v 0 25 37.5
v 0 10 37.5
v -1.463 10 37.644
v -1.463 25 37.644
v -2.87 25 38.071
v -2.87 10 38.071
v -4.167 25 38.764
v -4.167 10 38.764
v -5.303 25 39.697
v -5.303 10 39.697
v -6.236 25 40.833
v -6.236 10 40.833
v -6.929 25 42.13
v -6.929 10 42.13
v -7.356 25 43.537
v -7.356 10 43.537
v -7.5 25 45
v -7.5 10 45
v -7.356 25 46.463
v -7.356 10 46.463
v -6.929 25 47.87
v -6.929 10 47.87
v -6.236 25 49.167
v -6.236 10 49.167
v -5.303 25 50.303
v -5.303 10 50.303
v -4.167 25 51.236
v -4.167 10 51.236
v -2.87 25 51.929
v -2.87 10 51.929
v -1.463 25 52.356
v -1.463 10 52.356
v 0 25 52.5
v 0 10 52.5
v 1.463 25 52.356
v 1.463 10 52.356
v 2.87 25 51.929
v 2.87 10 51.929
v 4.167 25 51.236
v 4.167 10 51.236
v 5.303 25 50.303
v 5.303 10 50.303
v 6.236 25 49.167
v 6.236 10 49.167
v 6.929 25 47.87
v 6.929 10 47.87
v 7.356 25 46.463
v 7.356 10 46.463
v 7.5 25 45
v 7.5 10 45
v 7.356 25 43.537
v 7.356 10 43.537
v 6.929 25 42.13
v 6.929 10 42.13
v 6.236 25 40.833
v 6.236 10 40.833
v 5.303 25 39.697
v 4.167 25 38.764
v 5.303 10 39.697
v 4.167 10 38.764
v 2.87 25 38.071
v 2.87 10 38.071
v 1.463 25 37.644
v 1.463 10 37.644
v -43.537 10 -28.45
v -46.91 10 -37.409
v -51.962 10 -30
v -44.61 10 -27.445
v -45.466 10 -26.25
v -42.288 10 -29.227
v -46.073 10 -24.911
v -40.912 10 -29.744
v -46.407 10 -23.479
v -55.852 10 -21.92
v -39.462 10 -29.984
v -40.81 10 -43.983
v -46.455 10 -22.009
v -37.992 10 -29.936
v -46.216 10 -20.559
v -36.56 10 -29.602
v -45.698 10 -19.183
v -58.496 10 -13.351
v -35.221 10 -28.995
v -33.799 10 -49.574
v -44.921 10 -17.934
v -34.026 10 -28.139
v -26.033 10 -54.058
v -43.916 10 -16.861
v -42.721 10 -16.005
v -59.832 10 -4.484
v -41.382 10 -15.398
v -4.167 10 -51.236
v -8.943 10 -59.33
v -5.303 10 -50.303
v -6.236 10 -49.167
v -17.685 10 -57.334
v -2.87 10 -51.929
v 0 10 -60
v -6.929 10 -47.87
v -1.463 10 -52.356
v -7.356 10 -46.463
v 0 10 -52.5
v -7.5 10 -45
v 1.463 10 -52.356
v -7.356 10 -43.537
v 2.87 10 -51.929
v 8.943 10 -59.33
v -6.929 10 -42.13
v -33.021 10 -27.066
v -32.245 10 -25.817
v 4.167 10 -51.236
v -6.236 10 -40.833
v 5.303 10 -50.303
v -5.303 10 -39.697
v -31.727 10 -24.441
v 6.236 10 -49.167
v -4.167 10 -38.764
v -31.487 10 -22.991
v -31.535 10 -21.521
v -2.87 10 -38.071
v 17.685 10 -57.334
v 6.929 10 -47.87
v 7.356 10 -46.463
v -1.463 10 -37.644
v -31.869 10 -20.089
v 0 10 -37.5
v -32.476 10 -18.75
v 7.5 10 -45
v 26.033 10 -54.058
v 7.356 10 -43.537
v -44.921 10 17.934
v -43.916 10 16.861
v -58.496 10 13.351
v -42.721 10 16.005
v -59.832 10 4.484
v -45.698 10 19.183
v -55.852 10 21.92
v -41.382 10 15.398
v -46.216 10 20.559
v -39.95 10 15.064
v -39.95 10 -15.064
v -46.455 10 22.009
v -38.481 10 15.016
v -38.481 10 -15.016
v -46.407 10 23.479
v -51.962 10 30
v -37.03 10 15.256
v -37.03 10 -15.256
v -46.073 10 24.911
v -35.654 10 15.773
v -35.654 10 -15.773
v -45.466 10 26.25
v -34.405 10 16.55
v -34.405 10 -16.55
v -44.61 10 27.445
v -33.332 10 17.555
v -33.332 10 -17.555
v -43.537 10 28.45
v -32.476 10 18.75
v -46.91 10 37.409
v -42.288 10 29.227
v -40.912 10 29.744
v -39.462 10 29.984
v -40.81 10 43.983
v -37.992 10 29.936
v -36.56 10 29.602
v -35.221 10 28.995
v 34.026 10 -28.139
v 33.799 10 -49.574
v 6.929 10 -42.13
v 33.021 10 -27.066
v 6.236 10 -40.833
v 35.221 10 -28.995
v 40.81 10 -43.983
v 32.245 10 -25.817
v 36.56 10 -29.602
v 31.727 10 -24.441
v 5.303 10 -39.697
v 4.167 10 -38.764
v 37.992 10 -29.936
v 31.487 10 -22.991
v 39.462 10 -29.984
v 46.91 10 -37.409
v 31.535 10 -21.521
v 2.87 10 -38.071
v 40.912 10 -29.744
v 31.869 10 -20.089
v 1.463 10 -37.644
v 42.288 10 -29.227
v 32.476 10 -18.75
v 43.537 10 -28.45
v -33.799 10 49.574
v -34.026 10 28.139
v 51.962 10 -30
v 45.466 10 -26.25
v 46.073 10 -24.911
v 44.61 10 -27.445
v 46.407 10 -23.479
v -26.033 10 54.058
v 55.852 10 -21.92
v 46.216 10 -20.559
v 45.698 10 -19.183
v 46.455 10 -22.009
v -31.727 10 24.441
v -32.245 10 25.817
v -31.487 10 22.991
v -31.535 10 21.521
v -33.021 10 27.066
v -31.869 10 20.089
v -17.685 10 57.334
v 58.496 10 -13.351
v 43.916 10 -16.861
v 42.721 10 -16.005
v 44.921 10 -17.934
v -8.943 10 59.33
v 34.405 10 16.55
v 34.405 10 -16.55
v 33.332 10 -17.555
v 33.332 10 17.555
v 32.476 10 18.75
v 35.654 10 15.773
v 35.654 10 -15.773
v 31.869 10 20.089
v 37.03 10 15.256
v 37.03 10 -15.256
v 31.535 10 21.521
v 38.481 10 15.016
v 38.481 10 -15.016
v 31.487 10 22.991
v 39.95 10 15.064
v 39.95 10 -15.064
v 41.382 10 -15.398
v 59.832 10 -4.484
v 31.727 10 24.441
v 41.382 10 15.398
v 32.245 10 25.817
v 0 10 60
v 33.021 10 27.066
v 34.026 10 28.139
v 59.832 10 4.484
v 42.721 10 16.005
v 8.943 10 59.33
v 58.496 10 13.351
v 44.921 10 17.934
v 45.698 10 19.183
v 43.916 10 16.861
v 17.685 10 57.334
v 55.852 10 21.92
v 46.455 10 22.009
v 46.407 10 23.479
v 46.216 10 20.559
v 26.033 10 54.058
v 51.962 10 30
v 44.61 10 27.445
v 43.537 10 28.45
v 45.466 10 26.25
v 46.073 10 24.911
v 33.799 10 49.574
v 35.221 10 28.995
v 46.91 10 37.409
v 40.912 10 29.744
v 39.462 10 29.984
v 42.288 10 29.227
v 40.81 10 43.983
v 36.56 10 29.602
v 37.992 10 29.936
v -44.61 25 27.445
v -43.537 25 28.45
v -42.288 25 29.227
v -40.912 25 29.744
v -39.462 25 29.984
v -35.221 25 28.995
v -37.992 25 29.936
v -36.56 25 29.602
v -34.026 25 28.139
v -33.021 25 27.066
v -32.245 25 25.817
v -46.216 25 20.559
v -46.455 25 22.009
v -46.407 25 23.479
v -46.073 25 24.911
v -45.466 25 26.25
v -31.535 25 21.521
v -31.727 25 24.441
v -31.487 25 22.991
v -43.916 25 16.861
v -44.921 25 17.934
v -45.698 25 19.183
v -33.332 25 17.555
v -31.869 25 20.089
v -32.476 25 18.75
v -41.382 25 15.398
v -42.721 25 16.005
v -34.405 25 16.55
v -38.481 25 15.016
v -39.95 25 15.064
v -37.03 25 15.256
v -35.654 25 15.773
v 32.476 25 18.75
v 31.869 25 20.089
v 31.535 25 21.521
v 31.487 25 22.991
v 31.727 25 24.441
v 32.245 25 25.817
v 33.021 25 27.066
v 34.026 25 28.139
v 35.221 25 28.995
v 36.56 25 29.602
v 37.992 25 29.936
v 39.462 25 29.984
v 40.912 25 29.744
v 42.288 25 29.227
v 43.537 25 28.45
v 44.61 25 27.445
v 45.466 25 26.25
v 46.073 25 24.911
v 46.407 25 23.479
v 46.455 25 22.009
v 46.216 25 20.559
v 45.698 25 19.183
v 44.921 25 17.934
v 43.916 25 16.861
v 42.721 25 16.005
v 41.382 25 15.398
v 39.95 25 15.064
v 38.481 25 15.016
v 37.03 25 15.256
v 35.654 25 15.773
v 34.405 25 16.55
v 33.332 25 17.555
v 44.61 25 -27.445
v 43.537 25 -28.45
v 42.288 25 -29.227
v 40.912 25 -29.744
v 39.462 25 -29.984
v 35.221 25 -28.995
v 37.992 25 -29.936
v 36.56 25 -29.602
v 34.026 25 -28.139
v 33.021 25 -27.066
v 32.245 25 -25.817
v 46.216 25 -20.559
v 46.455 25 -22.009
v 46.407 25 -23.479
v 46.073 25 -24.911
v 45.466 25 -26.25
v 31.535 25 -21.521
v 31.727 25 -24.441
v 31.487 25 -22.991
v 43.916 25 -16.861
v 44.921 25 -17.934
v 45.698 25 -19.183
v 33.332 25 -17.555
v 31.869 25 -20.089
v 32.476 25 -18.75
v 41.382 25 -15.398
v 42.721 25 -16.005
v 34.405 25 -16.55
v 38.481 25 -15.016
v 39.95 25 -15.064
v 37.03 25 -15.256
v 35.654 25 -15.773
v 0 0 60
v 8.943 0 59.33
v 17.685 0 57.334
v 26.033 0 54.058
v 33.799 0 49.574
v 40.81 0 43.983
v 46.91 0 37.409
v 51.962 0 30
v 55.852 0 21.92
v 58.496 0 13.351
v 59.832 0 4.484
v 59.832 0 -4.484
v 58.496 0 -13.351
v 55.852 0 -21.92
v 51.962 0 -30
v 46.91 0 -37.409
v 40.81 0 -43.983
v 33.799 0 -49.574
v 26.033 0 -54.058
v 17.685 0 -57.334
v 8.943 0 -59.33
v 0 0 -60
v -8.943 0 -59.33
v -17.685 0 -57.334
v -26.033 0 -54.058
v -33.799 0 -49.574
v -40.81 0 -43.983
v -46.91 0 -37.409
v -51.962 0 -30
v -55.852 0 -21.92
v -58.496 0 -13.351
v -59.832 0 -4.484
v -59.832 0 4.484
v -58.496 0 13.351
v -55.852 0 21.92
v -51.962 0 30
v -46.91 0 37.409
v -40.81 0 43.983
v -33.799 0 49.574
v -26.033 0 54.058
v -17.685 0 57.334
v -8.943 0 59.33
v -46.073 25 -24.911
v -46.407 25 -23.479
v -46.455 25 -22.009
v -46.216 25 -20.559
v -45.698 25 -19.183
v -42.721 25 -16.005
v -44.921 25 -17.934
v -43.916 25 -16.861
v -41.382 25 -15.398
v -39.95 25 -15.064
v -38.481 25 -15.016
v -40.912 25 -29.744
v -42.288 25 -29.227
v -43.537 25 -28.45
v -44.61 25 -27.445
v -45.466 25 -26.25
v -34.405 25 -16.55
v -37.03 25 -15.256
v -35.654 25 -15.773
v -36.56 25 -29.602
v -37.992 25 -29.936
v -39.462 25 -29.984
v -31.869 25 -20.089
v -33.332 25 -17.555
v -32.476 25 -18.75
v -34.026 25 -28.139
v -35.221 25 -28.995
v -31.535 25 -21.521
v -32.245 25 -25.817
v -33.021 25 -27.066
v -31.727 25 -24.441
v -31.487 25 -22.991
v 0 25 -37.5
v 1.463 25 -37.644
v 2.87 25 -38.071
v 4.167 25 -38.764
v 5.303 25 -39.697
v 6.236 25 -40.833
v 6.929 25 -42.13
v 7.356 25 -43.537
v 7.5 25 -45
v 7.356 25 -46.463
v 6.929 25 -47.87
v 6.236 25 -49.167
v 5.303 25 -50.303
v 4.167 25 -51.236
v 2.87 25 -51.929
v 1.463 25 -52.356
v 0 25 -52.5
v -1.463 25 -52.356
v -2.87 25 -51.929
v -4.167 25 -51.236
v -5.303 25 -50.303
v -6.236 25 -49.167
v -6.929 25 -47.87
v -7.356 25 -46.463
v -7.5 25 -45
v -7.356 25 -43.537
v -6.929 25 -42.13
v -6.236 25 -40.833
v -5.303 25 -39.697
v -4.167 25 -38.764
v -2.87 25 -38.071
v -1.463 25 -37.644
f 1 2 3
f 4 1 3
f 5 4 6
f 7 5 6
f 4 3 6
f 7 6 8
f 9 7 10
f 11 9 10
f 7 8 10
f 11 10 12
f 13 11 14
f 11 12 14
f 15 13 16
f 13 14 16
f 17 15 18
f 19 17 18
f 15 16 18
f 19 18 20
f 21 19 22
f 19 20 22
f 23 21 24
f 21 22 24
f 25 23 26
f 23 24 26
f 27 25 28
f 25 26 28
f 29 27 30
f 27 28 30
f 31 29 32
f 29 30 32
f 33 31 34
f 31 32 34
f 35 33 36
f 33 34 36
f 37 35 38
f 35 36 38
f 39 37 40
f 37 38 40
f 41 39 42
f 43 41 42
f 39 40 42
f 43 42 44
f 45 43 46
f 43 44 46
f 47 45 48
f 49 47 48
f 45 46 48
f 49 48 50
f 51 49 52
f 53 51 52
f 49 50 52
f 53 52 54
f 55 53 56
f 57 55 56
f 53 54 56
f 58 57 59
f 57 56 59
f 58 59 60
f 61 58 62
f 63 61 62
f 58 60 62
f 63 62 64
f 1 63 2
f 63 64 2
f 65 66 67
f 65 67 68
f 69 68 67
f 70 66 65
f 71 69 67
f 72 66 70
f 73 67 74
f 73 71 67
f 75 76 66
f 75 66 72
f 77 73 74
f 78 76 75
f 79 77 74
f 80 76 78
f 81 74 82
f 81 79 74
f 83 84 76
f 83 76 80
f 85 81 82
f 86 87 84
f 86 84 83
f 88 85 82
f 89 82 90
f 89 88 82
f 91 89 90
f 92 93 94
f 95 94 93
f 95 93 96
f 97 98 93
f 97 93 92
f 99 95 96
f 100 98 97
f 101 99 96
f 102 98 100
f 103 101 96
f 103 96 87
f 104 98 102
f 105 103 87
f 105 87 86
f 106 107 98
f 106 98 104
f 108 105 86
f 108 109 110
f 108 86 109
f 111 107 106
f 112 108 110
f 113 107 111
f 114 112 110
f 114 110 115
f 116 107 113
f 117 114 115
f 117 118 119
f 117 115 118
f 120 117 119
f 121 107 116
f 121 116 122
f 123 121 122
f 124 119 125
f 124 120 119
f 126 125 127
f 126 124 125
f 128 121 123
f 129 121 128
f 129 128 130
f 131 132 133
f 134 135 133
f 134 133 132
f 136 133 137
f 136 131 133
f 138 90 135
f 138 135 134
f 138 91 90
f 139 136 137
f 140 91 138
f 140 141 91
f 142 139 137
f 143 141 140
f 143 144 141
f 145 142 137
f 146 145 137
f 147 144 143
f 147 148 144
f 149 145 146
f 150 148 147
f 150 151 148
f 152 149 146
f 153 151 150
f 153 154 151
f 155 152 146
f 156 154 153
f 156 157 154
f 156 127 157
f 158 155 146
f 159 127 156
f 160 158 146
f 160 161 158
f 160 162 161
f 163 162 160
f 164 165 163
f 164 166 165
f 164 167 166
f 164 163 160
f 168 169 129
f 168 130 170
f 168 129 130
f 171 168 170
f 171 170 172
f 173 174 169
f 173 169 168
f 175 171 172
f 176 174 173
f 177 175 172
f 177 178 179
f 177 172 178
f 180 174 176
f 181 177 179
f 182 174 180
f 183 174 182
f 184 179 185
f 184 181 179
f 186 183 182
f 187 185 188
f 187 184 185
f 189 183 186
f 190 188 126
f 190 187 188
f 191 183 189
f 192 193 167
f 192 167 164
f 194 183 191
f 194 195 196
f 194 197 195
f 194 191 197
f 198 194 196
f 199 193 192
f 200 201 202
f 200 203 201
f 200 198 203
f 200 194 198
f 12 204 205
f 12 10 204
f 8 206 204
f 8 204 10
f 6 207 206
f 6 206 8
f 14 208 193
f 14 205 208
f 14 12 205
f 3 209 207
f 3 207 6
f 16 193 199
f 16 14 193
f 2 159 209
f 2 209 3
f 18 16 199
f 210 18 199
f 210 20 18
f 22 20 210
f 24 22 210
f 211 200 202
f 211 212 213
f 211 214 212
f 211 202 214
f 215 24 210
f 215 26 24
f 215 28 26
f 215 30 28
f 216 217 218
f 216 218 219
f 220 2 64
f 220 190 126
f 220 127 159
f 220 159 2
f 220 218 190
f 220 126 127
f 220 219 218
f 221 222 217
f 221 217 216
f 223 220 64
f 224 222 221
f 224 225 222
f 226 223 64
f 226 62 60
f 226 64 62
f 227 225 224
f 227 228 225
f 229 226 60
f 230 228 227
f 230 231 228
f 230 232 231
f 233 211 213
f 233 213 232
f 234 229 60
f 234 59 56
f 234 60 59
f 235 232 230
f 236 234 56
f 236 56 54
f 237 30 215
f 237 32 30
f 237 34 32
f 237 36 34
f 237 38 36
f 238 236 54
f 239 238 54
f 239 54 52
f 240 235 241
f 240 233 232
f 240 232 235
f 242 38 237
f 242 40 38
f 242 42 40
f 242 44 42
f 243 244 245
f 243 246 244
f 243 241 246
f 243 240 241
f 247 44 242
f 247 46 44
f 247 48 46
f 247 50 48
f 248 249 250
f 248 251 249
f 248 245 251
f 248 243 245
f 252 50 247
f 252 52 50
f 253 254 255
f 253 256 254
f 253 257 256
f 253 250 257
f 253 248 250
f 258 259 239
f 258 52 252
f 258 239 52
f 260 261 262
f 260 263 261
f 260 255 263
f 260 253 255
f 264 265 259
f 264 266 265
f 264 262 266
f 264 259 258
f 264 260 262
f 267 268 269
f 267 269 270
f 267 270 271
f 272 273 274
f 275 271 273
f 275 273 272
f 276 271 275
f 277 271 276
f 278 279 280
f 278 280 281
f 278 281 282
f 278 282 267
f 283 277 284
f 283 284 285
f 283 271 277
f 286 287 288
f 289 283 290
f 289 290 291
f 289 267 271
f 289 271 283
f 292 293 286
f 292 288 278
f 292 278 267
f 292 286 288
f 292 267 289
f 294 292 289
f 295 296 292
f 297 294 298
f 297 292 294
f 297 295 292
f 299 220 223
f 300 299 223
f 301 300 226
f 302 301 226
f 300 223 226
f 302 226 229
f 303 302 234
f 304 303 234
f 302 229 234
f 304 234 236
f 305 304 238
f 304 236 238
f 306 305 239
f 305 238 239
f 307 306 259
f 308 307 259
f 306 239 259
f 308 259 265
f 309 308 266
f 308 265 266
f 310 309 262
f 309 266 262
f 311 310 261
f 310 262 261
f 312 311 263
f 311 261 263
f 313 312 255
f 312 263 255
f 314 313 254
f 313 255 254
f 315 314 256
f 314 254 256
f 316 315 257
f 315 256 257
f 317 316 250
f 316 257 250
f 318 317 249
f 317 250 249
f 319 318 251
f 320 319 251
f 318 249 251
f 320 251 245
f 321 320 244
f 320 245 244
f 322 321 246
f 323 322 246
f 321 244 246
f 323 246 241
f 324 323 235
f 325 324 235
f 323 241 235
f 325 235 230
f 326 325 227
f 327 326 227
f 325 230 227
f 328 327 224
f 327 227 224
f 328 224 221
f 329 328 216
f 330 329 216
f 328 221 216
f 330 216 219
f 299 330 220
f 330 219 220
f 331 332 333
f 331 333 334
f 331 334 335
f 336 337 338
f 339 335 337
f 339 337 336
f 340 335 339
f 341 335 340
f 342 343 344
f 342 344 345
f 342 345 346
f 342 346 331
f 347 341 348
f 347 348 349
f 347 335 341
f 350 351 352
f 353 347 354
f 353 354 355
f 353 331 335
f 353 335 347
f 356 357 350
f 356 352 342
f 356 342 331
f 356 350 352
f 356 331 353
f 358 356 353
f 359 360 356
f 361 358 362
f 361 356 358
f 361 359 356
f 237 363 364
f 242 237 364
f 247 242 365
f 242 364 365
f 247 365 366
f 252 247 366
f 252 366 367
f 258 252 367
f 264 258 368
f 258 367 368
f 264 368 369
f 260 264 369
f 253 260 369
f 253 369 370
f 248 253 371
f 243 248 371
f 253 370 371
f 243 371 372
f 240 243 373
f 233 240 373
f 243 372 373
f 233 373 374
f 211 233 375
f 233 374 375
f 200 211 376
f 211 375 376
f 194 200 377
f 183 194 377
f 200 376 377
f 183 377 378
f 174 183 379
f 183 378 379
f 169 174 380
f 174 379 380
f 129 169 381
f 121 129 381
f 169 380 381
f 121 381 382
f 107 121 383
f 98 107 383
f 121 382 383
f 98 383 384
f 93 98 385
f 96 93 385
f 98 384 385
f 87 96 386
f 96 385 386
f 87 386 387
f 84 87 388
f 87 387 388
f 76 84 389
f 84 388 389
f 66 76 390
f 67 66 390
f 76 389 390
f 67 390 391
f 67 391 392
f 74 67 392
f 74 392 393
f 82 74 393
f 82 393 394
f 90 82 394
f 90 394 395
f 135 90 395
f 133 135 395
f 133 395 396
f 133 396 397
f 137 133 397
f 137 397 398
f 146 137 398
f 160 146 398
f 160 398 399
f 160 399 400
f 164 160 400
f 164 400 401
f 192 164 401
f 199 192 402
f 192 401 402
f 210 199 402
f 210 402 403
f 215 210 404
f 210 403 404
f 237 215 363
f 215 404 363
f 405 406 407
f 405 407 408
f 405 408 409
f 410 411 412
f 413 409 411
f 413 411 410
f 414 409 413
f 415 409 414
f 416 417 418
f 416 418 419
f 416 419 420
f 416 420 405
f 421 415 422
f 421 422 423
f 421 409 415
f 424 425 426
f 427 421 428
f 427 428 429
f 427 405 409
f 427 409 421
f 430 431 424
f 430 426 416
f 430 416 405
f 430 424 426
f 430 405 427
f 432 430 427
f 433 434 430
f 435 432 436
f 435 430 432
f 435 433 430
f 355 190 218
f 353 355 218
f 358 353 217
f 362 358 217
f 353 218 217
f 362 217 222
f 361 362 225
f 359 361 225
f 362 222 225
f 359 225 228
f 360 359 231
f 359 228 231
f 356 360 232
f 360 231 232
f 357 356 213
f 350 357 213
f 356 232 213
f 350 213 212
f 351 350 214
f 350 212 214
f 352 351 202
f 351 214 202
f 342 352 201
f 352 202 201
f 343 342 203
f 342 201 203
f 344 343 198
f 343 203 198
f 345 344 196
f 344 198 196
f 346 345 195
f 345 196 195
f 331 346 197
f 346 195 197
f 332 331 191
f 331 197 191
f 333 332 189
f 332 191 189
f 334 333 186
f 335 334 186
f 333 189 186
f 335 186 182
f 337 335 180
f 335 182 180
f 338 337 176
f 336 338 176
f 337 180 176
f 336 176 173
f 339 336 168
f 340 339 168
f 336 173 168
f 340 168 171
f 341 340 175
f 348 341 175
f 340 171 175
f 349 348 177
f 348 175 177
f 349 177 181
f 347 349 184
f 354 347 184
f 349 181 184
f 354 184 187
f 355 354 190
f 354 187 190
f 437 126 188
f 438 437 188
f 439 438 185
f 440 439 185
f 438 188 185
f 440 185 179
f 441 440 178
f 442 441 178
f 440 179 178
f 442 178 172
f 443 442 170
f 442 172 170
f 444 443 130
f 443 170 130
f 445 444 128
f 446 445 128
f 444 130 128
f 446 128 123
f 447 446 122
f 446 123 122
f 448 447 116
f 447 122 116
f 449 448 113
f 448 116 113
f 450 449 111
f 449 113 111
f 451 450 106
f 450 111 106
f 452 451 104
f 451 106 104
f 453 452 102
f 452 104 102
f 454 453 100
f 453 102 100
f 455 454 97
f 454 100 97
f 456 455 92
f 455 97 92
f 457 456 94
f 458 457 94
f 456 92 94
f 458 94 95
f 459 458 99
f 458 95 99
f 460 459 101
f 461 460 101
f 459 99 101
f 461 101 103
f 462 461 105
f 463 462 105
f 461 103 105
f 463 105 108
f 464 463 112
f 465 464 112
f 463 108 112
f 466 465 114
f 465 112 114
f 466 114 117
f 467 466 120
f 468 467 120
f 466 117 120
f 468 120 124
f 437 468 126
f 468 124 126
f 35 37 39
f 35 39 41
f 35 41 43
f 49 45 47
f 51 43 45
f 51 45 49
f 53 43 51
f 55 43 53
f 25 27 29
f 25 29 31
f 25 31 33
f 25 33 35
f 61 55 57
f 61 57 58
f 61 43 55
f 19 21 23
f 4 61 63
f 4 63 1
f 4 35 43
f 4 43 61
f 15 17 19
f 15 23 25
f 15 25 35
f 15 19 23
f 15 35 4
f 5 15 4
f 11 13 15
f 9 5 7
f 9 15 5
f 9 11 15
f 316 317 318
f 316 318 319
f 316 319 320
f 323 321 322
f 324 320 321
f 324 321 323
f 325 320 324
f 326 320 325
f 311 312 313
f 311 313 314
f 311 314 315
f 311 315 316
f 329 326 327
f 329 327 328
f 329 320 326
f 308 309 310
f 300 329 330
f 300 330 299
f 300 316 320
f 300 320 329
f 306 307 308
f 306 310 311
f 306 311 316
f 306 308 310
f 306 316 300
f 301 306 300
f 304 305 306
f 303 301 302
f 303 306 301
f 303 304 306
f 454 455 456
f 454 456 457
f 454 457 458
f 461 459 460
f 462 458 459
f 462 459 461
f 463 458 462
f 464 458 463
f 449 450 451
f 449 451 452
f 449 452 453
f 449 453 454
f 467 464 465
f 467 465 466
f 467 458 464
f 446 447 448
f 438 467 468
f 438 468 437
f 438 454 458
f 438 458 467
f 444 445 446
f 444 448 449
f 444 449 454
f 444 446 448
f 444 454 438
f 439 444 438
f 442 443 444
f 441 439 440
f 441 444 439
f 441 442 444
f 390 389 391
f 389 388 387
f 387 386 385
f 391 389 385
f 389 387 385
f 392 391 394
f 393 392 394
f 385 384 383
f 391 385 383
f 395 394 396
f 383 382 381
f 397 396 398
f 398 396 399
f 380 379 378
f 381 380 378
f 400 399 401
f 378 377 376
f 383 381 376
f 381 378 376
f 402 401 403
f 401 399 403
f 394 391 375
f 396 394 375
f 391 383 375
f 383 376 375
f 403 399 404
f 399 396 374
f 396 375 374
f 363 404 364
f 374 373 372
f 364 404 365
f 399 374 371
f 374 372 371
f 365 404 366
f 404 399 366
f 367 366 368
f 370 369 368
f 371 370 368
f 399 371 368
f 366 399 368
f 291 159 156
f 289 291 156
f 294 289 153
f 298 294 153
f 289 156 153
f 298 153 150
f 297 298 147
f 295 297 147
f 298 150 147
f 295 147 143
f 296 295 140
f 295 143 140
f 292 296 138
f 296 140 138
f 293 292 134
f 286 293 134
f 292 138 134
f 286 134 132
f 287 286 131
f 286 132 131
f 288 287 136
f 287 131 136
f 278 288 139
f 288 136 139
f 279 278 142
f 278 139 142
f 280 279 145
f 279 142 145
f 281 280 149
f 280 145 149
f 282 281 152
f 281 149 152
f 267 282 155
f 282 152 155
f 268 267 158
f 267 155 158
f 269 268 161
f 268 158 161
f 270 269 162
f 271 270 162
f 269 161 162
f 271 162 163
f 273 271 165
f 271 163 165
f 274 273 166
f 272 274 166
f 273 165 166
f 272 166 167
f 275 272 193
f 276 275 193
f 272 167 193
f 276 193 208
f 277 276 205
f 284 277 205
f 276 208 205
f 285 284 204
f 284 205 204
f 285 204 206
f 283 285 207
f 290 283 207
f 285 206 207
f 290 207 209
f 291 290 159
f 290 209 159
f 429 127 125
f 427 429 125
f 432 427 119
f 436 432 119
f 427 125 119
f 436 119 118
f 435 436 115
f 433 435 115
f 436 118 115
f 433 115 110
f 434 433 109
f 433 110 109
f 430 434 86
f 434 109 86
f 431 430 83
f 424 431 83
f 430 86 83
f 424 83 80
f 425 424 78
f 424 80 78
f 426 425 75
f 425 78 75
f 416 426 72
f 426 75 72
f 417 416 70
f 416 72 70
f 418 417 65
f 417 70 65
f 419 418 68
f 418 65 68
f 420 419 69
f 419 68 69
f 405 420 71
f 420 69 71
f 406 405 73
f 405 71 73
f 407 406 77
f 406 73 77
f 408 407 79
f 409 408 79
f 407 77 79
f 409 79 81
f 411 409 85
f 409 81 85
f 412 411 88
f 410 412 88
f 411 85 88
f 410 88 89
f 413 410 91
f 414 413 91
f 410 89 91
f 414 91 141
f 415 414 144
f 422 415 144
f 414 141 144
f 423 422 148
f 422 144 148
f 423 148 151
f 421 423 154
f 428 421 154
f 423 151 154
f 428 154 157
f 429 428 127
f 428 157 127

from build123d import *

# Parameters (mm, degrees)
ESQUISSE1_R                  = 60
BOSS_EXTRU_1_DEPTH           = 10
ESQUISSE2_R                  = 7.5
BOSS_EXTRU_2_DEPTH           = 15
R_P_TITION_CIRCULAIRE1_COUNT = 6


with BuildPart() as part:
    # Esquisse1 → Boss.-Extru.1 (new body)
    with BuildSketch(Plane(origin=(0, 0, 0), x_dir=(1, 0, 0), z_dir=(0, 1, 0))):
        with Locations(Location((0, 0, 0), (0, 0, 270))):
            Circle(ESQUISSE1_R)
    extrude(amount=BOSS_EXTRU_1_DEPTH)

    # Esquisse2 → Boss.-Extru.2 (add)
    with BuildSketch(Plane(origin=(0, 10, 0), x_dir=(1, 0, 0), z_dir=(0, 1, 0))):
        with Locations(Location((0, 45, 0), (0, 0, 270))):
            Circle(ESQUISSE2_R)
    boss_extru_2 = extrude(amount=BOSS_EXTRU_2_DEPTH)

    # Répétition circulaire1: Boss.-Extru.2 ×6 about axis
    r_p_tition_circulaire1_axis = Axis((0, 0, 0), (0, 1, 0))
    for i in range(1, R_P_TITION_CIRCULAIRE1_COUNT):
        add(boss_extru_2.rotate(r_p_tition_circulaire1_axis, i * 360 / R_P_TITION_CIRCULAIRE1_COUNT))


solid = part.part
